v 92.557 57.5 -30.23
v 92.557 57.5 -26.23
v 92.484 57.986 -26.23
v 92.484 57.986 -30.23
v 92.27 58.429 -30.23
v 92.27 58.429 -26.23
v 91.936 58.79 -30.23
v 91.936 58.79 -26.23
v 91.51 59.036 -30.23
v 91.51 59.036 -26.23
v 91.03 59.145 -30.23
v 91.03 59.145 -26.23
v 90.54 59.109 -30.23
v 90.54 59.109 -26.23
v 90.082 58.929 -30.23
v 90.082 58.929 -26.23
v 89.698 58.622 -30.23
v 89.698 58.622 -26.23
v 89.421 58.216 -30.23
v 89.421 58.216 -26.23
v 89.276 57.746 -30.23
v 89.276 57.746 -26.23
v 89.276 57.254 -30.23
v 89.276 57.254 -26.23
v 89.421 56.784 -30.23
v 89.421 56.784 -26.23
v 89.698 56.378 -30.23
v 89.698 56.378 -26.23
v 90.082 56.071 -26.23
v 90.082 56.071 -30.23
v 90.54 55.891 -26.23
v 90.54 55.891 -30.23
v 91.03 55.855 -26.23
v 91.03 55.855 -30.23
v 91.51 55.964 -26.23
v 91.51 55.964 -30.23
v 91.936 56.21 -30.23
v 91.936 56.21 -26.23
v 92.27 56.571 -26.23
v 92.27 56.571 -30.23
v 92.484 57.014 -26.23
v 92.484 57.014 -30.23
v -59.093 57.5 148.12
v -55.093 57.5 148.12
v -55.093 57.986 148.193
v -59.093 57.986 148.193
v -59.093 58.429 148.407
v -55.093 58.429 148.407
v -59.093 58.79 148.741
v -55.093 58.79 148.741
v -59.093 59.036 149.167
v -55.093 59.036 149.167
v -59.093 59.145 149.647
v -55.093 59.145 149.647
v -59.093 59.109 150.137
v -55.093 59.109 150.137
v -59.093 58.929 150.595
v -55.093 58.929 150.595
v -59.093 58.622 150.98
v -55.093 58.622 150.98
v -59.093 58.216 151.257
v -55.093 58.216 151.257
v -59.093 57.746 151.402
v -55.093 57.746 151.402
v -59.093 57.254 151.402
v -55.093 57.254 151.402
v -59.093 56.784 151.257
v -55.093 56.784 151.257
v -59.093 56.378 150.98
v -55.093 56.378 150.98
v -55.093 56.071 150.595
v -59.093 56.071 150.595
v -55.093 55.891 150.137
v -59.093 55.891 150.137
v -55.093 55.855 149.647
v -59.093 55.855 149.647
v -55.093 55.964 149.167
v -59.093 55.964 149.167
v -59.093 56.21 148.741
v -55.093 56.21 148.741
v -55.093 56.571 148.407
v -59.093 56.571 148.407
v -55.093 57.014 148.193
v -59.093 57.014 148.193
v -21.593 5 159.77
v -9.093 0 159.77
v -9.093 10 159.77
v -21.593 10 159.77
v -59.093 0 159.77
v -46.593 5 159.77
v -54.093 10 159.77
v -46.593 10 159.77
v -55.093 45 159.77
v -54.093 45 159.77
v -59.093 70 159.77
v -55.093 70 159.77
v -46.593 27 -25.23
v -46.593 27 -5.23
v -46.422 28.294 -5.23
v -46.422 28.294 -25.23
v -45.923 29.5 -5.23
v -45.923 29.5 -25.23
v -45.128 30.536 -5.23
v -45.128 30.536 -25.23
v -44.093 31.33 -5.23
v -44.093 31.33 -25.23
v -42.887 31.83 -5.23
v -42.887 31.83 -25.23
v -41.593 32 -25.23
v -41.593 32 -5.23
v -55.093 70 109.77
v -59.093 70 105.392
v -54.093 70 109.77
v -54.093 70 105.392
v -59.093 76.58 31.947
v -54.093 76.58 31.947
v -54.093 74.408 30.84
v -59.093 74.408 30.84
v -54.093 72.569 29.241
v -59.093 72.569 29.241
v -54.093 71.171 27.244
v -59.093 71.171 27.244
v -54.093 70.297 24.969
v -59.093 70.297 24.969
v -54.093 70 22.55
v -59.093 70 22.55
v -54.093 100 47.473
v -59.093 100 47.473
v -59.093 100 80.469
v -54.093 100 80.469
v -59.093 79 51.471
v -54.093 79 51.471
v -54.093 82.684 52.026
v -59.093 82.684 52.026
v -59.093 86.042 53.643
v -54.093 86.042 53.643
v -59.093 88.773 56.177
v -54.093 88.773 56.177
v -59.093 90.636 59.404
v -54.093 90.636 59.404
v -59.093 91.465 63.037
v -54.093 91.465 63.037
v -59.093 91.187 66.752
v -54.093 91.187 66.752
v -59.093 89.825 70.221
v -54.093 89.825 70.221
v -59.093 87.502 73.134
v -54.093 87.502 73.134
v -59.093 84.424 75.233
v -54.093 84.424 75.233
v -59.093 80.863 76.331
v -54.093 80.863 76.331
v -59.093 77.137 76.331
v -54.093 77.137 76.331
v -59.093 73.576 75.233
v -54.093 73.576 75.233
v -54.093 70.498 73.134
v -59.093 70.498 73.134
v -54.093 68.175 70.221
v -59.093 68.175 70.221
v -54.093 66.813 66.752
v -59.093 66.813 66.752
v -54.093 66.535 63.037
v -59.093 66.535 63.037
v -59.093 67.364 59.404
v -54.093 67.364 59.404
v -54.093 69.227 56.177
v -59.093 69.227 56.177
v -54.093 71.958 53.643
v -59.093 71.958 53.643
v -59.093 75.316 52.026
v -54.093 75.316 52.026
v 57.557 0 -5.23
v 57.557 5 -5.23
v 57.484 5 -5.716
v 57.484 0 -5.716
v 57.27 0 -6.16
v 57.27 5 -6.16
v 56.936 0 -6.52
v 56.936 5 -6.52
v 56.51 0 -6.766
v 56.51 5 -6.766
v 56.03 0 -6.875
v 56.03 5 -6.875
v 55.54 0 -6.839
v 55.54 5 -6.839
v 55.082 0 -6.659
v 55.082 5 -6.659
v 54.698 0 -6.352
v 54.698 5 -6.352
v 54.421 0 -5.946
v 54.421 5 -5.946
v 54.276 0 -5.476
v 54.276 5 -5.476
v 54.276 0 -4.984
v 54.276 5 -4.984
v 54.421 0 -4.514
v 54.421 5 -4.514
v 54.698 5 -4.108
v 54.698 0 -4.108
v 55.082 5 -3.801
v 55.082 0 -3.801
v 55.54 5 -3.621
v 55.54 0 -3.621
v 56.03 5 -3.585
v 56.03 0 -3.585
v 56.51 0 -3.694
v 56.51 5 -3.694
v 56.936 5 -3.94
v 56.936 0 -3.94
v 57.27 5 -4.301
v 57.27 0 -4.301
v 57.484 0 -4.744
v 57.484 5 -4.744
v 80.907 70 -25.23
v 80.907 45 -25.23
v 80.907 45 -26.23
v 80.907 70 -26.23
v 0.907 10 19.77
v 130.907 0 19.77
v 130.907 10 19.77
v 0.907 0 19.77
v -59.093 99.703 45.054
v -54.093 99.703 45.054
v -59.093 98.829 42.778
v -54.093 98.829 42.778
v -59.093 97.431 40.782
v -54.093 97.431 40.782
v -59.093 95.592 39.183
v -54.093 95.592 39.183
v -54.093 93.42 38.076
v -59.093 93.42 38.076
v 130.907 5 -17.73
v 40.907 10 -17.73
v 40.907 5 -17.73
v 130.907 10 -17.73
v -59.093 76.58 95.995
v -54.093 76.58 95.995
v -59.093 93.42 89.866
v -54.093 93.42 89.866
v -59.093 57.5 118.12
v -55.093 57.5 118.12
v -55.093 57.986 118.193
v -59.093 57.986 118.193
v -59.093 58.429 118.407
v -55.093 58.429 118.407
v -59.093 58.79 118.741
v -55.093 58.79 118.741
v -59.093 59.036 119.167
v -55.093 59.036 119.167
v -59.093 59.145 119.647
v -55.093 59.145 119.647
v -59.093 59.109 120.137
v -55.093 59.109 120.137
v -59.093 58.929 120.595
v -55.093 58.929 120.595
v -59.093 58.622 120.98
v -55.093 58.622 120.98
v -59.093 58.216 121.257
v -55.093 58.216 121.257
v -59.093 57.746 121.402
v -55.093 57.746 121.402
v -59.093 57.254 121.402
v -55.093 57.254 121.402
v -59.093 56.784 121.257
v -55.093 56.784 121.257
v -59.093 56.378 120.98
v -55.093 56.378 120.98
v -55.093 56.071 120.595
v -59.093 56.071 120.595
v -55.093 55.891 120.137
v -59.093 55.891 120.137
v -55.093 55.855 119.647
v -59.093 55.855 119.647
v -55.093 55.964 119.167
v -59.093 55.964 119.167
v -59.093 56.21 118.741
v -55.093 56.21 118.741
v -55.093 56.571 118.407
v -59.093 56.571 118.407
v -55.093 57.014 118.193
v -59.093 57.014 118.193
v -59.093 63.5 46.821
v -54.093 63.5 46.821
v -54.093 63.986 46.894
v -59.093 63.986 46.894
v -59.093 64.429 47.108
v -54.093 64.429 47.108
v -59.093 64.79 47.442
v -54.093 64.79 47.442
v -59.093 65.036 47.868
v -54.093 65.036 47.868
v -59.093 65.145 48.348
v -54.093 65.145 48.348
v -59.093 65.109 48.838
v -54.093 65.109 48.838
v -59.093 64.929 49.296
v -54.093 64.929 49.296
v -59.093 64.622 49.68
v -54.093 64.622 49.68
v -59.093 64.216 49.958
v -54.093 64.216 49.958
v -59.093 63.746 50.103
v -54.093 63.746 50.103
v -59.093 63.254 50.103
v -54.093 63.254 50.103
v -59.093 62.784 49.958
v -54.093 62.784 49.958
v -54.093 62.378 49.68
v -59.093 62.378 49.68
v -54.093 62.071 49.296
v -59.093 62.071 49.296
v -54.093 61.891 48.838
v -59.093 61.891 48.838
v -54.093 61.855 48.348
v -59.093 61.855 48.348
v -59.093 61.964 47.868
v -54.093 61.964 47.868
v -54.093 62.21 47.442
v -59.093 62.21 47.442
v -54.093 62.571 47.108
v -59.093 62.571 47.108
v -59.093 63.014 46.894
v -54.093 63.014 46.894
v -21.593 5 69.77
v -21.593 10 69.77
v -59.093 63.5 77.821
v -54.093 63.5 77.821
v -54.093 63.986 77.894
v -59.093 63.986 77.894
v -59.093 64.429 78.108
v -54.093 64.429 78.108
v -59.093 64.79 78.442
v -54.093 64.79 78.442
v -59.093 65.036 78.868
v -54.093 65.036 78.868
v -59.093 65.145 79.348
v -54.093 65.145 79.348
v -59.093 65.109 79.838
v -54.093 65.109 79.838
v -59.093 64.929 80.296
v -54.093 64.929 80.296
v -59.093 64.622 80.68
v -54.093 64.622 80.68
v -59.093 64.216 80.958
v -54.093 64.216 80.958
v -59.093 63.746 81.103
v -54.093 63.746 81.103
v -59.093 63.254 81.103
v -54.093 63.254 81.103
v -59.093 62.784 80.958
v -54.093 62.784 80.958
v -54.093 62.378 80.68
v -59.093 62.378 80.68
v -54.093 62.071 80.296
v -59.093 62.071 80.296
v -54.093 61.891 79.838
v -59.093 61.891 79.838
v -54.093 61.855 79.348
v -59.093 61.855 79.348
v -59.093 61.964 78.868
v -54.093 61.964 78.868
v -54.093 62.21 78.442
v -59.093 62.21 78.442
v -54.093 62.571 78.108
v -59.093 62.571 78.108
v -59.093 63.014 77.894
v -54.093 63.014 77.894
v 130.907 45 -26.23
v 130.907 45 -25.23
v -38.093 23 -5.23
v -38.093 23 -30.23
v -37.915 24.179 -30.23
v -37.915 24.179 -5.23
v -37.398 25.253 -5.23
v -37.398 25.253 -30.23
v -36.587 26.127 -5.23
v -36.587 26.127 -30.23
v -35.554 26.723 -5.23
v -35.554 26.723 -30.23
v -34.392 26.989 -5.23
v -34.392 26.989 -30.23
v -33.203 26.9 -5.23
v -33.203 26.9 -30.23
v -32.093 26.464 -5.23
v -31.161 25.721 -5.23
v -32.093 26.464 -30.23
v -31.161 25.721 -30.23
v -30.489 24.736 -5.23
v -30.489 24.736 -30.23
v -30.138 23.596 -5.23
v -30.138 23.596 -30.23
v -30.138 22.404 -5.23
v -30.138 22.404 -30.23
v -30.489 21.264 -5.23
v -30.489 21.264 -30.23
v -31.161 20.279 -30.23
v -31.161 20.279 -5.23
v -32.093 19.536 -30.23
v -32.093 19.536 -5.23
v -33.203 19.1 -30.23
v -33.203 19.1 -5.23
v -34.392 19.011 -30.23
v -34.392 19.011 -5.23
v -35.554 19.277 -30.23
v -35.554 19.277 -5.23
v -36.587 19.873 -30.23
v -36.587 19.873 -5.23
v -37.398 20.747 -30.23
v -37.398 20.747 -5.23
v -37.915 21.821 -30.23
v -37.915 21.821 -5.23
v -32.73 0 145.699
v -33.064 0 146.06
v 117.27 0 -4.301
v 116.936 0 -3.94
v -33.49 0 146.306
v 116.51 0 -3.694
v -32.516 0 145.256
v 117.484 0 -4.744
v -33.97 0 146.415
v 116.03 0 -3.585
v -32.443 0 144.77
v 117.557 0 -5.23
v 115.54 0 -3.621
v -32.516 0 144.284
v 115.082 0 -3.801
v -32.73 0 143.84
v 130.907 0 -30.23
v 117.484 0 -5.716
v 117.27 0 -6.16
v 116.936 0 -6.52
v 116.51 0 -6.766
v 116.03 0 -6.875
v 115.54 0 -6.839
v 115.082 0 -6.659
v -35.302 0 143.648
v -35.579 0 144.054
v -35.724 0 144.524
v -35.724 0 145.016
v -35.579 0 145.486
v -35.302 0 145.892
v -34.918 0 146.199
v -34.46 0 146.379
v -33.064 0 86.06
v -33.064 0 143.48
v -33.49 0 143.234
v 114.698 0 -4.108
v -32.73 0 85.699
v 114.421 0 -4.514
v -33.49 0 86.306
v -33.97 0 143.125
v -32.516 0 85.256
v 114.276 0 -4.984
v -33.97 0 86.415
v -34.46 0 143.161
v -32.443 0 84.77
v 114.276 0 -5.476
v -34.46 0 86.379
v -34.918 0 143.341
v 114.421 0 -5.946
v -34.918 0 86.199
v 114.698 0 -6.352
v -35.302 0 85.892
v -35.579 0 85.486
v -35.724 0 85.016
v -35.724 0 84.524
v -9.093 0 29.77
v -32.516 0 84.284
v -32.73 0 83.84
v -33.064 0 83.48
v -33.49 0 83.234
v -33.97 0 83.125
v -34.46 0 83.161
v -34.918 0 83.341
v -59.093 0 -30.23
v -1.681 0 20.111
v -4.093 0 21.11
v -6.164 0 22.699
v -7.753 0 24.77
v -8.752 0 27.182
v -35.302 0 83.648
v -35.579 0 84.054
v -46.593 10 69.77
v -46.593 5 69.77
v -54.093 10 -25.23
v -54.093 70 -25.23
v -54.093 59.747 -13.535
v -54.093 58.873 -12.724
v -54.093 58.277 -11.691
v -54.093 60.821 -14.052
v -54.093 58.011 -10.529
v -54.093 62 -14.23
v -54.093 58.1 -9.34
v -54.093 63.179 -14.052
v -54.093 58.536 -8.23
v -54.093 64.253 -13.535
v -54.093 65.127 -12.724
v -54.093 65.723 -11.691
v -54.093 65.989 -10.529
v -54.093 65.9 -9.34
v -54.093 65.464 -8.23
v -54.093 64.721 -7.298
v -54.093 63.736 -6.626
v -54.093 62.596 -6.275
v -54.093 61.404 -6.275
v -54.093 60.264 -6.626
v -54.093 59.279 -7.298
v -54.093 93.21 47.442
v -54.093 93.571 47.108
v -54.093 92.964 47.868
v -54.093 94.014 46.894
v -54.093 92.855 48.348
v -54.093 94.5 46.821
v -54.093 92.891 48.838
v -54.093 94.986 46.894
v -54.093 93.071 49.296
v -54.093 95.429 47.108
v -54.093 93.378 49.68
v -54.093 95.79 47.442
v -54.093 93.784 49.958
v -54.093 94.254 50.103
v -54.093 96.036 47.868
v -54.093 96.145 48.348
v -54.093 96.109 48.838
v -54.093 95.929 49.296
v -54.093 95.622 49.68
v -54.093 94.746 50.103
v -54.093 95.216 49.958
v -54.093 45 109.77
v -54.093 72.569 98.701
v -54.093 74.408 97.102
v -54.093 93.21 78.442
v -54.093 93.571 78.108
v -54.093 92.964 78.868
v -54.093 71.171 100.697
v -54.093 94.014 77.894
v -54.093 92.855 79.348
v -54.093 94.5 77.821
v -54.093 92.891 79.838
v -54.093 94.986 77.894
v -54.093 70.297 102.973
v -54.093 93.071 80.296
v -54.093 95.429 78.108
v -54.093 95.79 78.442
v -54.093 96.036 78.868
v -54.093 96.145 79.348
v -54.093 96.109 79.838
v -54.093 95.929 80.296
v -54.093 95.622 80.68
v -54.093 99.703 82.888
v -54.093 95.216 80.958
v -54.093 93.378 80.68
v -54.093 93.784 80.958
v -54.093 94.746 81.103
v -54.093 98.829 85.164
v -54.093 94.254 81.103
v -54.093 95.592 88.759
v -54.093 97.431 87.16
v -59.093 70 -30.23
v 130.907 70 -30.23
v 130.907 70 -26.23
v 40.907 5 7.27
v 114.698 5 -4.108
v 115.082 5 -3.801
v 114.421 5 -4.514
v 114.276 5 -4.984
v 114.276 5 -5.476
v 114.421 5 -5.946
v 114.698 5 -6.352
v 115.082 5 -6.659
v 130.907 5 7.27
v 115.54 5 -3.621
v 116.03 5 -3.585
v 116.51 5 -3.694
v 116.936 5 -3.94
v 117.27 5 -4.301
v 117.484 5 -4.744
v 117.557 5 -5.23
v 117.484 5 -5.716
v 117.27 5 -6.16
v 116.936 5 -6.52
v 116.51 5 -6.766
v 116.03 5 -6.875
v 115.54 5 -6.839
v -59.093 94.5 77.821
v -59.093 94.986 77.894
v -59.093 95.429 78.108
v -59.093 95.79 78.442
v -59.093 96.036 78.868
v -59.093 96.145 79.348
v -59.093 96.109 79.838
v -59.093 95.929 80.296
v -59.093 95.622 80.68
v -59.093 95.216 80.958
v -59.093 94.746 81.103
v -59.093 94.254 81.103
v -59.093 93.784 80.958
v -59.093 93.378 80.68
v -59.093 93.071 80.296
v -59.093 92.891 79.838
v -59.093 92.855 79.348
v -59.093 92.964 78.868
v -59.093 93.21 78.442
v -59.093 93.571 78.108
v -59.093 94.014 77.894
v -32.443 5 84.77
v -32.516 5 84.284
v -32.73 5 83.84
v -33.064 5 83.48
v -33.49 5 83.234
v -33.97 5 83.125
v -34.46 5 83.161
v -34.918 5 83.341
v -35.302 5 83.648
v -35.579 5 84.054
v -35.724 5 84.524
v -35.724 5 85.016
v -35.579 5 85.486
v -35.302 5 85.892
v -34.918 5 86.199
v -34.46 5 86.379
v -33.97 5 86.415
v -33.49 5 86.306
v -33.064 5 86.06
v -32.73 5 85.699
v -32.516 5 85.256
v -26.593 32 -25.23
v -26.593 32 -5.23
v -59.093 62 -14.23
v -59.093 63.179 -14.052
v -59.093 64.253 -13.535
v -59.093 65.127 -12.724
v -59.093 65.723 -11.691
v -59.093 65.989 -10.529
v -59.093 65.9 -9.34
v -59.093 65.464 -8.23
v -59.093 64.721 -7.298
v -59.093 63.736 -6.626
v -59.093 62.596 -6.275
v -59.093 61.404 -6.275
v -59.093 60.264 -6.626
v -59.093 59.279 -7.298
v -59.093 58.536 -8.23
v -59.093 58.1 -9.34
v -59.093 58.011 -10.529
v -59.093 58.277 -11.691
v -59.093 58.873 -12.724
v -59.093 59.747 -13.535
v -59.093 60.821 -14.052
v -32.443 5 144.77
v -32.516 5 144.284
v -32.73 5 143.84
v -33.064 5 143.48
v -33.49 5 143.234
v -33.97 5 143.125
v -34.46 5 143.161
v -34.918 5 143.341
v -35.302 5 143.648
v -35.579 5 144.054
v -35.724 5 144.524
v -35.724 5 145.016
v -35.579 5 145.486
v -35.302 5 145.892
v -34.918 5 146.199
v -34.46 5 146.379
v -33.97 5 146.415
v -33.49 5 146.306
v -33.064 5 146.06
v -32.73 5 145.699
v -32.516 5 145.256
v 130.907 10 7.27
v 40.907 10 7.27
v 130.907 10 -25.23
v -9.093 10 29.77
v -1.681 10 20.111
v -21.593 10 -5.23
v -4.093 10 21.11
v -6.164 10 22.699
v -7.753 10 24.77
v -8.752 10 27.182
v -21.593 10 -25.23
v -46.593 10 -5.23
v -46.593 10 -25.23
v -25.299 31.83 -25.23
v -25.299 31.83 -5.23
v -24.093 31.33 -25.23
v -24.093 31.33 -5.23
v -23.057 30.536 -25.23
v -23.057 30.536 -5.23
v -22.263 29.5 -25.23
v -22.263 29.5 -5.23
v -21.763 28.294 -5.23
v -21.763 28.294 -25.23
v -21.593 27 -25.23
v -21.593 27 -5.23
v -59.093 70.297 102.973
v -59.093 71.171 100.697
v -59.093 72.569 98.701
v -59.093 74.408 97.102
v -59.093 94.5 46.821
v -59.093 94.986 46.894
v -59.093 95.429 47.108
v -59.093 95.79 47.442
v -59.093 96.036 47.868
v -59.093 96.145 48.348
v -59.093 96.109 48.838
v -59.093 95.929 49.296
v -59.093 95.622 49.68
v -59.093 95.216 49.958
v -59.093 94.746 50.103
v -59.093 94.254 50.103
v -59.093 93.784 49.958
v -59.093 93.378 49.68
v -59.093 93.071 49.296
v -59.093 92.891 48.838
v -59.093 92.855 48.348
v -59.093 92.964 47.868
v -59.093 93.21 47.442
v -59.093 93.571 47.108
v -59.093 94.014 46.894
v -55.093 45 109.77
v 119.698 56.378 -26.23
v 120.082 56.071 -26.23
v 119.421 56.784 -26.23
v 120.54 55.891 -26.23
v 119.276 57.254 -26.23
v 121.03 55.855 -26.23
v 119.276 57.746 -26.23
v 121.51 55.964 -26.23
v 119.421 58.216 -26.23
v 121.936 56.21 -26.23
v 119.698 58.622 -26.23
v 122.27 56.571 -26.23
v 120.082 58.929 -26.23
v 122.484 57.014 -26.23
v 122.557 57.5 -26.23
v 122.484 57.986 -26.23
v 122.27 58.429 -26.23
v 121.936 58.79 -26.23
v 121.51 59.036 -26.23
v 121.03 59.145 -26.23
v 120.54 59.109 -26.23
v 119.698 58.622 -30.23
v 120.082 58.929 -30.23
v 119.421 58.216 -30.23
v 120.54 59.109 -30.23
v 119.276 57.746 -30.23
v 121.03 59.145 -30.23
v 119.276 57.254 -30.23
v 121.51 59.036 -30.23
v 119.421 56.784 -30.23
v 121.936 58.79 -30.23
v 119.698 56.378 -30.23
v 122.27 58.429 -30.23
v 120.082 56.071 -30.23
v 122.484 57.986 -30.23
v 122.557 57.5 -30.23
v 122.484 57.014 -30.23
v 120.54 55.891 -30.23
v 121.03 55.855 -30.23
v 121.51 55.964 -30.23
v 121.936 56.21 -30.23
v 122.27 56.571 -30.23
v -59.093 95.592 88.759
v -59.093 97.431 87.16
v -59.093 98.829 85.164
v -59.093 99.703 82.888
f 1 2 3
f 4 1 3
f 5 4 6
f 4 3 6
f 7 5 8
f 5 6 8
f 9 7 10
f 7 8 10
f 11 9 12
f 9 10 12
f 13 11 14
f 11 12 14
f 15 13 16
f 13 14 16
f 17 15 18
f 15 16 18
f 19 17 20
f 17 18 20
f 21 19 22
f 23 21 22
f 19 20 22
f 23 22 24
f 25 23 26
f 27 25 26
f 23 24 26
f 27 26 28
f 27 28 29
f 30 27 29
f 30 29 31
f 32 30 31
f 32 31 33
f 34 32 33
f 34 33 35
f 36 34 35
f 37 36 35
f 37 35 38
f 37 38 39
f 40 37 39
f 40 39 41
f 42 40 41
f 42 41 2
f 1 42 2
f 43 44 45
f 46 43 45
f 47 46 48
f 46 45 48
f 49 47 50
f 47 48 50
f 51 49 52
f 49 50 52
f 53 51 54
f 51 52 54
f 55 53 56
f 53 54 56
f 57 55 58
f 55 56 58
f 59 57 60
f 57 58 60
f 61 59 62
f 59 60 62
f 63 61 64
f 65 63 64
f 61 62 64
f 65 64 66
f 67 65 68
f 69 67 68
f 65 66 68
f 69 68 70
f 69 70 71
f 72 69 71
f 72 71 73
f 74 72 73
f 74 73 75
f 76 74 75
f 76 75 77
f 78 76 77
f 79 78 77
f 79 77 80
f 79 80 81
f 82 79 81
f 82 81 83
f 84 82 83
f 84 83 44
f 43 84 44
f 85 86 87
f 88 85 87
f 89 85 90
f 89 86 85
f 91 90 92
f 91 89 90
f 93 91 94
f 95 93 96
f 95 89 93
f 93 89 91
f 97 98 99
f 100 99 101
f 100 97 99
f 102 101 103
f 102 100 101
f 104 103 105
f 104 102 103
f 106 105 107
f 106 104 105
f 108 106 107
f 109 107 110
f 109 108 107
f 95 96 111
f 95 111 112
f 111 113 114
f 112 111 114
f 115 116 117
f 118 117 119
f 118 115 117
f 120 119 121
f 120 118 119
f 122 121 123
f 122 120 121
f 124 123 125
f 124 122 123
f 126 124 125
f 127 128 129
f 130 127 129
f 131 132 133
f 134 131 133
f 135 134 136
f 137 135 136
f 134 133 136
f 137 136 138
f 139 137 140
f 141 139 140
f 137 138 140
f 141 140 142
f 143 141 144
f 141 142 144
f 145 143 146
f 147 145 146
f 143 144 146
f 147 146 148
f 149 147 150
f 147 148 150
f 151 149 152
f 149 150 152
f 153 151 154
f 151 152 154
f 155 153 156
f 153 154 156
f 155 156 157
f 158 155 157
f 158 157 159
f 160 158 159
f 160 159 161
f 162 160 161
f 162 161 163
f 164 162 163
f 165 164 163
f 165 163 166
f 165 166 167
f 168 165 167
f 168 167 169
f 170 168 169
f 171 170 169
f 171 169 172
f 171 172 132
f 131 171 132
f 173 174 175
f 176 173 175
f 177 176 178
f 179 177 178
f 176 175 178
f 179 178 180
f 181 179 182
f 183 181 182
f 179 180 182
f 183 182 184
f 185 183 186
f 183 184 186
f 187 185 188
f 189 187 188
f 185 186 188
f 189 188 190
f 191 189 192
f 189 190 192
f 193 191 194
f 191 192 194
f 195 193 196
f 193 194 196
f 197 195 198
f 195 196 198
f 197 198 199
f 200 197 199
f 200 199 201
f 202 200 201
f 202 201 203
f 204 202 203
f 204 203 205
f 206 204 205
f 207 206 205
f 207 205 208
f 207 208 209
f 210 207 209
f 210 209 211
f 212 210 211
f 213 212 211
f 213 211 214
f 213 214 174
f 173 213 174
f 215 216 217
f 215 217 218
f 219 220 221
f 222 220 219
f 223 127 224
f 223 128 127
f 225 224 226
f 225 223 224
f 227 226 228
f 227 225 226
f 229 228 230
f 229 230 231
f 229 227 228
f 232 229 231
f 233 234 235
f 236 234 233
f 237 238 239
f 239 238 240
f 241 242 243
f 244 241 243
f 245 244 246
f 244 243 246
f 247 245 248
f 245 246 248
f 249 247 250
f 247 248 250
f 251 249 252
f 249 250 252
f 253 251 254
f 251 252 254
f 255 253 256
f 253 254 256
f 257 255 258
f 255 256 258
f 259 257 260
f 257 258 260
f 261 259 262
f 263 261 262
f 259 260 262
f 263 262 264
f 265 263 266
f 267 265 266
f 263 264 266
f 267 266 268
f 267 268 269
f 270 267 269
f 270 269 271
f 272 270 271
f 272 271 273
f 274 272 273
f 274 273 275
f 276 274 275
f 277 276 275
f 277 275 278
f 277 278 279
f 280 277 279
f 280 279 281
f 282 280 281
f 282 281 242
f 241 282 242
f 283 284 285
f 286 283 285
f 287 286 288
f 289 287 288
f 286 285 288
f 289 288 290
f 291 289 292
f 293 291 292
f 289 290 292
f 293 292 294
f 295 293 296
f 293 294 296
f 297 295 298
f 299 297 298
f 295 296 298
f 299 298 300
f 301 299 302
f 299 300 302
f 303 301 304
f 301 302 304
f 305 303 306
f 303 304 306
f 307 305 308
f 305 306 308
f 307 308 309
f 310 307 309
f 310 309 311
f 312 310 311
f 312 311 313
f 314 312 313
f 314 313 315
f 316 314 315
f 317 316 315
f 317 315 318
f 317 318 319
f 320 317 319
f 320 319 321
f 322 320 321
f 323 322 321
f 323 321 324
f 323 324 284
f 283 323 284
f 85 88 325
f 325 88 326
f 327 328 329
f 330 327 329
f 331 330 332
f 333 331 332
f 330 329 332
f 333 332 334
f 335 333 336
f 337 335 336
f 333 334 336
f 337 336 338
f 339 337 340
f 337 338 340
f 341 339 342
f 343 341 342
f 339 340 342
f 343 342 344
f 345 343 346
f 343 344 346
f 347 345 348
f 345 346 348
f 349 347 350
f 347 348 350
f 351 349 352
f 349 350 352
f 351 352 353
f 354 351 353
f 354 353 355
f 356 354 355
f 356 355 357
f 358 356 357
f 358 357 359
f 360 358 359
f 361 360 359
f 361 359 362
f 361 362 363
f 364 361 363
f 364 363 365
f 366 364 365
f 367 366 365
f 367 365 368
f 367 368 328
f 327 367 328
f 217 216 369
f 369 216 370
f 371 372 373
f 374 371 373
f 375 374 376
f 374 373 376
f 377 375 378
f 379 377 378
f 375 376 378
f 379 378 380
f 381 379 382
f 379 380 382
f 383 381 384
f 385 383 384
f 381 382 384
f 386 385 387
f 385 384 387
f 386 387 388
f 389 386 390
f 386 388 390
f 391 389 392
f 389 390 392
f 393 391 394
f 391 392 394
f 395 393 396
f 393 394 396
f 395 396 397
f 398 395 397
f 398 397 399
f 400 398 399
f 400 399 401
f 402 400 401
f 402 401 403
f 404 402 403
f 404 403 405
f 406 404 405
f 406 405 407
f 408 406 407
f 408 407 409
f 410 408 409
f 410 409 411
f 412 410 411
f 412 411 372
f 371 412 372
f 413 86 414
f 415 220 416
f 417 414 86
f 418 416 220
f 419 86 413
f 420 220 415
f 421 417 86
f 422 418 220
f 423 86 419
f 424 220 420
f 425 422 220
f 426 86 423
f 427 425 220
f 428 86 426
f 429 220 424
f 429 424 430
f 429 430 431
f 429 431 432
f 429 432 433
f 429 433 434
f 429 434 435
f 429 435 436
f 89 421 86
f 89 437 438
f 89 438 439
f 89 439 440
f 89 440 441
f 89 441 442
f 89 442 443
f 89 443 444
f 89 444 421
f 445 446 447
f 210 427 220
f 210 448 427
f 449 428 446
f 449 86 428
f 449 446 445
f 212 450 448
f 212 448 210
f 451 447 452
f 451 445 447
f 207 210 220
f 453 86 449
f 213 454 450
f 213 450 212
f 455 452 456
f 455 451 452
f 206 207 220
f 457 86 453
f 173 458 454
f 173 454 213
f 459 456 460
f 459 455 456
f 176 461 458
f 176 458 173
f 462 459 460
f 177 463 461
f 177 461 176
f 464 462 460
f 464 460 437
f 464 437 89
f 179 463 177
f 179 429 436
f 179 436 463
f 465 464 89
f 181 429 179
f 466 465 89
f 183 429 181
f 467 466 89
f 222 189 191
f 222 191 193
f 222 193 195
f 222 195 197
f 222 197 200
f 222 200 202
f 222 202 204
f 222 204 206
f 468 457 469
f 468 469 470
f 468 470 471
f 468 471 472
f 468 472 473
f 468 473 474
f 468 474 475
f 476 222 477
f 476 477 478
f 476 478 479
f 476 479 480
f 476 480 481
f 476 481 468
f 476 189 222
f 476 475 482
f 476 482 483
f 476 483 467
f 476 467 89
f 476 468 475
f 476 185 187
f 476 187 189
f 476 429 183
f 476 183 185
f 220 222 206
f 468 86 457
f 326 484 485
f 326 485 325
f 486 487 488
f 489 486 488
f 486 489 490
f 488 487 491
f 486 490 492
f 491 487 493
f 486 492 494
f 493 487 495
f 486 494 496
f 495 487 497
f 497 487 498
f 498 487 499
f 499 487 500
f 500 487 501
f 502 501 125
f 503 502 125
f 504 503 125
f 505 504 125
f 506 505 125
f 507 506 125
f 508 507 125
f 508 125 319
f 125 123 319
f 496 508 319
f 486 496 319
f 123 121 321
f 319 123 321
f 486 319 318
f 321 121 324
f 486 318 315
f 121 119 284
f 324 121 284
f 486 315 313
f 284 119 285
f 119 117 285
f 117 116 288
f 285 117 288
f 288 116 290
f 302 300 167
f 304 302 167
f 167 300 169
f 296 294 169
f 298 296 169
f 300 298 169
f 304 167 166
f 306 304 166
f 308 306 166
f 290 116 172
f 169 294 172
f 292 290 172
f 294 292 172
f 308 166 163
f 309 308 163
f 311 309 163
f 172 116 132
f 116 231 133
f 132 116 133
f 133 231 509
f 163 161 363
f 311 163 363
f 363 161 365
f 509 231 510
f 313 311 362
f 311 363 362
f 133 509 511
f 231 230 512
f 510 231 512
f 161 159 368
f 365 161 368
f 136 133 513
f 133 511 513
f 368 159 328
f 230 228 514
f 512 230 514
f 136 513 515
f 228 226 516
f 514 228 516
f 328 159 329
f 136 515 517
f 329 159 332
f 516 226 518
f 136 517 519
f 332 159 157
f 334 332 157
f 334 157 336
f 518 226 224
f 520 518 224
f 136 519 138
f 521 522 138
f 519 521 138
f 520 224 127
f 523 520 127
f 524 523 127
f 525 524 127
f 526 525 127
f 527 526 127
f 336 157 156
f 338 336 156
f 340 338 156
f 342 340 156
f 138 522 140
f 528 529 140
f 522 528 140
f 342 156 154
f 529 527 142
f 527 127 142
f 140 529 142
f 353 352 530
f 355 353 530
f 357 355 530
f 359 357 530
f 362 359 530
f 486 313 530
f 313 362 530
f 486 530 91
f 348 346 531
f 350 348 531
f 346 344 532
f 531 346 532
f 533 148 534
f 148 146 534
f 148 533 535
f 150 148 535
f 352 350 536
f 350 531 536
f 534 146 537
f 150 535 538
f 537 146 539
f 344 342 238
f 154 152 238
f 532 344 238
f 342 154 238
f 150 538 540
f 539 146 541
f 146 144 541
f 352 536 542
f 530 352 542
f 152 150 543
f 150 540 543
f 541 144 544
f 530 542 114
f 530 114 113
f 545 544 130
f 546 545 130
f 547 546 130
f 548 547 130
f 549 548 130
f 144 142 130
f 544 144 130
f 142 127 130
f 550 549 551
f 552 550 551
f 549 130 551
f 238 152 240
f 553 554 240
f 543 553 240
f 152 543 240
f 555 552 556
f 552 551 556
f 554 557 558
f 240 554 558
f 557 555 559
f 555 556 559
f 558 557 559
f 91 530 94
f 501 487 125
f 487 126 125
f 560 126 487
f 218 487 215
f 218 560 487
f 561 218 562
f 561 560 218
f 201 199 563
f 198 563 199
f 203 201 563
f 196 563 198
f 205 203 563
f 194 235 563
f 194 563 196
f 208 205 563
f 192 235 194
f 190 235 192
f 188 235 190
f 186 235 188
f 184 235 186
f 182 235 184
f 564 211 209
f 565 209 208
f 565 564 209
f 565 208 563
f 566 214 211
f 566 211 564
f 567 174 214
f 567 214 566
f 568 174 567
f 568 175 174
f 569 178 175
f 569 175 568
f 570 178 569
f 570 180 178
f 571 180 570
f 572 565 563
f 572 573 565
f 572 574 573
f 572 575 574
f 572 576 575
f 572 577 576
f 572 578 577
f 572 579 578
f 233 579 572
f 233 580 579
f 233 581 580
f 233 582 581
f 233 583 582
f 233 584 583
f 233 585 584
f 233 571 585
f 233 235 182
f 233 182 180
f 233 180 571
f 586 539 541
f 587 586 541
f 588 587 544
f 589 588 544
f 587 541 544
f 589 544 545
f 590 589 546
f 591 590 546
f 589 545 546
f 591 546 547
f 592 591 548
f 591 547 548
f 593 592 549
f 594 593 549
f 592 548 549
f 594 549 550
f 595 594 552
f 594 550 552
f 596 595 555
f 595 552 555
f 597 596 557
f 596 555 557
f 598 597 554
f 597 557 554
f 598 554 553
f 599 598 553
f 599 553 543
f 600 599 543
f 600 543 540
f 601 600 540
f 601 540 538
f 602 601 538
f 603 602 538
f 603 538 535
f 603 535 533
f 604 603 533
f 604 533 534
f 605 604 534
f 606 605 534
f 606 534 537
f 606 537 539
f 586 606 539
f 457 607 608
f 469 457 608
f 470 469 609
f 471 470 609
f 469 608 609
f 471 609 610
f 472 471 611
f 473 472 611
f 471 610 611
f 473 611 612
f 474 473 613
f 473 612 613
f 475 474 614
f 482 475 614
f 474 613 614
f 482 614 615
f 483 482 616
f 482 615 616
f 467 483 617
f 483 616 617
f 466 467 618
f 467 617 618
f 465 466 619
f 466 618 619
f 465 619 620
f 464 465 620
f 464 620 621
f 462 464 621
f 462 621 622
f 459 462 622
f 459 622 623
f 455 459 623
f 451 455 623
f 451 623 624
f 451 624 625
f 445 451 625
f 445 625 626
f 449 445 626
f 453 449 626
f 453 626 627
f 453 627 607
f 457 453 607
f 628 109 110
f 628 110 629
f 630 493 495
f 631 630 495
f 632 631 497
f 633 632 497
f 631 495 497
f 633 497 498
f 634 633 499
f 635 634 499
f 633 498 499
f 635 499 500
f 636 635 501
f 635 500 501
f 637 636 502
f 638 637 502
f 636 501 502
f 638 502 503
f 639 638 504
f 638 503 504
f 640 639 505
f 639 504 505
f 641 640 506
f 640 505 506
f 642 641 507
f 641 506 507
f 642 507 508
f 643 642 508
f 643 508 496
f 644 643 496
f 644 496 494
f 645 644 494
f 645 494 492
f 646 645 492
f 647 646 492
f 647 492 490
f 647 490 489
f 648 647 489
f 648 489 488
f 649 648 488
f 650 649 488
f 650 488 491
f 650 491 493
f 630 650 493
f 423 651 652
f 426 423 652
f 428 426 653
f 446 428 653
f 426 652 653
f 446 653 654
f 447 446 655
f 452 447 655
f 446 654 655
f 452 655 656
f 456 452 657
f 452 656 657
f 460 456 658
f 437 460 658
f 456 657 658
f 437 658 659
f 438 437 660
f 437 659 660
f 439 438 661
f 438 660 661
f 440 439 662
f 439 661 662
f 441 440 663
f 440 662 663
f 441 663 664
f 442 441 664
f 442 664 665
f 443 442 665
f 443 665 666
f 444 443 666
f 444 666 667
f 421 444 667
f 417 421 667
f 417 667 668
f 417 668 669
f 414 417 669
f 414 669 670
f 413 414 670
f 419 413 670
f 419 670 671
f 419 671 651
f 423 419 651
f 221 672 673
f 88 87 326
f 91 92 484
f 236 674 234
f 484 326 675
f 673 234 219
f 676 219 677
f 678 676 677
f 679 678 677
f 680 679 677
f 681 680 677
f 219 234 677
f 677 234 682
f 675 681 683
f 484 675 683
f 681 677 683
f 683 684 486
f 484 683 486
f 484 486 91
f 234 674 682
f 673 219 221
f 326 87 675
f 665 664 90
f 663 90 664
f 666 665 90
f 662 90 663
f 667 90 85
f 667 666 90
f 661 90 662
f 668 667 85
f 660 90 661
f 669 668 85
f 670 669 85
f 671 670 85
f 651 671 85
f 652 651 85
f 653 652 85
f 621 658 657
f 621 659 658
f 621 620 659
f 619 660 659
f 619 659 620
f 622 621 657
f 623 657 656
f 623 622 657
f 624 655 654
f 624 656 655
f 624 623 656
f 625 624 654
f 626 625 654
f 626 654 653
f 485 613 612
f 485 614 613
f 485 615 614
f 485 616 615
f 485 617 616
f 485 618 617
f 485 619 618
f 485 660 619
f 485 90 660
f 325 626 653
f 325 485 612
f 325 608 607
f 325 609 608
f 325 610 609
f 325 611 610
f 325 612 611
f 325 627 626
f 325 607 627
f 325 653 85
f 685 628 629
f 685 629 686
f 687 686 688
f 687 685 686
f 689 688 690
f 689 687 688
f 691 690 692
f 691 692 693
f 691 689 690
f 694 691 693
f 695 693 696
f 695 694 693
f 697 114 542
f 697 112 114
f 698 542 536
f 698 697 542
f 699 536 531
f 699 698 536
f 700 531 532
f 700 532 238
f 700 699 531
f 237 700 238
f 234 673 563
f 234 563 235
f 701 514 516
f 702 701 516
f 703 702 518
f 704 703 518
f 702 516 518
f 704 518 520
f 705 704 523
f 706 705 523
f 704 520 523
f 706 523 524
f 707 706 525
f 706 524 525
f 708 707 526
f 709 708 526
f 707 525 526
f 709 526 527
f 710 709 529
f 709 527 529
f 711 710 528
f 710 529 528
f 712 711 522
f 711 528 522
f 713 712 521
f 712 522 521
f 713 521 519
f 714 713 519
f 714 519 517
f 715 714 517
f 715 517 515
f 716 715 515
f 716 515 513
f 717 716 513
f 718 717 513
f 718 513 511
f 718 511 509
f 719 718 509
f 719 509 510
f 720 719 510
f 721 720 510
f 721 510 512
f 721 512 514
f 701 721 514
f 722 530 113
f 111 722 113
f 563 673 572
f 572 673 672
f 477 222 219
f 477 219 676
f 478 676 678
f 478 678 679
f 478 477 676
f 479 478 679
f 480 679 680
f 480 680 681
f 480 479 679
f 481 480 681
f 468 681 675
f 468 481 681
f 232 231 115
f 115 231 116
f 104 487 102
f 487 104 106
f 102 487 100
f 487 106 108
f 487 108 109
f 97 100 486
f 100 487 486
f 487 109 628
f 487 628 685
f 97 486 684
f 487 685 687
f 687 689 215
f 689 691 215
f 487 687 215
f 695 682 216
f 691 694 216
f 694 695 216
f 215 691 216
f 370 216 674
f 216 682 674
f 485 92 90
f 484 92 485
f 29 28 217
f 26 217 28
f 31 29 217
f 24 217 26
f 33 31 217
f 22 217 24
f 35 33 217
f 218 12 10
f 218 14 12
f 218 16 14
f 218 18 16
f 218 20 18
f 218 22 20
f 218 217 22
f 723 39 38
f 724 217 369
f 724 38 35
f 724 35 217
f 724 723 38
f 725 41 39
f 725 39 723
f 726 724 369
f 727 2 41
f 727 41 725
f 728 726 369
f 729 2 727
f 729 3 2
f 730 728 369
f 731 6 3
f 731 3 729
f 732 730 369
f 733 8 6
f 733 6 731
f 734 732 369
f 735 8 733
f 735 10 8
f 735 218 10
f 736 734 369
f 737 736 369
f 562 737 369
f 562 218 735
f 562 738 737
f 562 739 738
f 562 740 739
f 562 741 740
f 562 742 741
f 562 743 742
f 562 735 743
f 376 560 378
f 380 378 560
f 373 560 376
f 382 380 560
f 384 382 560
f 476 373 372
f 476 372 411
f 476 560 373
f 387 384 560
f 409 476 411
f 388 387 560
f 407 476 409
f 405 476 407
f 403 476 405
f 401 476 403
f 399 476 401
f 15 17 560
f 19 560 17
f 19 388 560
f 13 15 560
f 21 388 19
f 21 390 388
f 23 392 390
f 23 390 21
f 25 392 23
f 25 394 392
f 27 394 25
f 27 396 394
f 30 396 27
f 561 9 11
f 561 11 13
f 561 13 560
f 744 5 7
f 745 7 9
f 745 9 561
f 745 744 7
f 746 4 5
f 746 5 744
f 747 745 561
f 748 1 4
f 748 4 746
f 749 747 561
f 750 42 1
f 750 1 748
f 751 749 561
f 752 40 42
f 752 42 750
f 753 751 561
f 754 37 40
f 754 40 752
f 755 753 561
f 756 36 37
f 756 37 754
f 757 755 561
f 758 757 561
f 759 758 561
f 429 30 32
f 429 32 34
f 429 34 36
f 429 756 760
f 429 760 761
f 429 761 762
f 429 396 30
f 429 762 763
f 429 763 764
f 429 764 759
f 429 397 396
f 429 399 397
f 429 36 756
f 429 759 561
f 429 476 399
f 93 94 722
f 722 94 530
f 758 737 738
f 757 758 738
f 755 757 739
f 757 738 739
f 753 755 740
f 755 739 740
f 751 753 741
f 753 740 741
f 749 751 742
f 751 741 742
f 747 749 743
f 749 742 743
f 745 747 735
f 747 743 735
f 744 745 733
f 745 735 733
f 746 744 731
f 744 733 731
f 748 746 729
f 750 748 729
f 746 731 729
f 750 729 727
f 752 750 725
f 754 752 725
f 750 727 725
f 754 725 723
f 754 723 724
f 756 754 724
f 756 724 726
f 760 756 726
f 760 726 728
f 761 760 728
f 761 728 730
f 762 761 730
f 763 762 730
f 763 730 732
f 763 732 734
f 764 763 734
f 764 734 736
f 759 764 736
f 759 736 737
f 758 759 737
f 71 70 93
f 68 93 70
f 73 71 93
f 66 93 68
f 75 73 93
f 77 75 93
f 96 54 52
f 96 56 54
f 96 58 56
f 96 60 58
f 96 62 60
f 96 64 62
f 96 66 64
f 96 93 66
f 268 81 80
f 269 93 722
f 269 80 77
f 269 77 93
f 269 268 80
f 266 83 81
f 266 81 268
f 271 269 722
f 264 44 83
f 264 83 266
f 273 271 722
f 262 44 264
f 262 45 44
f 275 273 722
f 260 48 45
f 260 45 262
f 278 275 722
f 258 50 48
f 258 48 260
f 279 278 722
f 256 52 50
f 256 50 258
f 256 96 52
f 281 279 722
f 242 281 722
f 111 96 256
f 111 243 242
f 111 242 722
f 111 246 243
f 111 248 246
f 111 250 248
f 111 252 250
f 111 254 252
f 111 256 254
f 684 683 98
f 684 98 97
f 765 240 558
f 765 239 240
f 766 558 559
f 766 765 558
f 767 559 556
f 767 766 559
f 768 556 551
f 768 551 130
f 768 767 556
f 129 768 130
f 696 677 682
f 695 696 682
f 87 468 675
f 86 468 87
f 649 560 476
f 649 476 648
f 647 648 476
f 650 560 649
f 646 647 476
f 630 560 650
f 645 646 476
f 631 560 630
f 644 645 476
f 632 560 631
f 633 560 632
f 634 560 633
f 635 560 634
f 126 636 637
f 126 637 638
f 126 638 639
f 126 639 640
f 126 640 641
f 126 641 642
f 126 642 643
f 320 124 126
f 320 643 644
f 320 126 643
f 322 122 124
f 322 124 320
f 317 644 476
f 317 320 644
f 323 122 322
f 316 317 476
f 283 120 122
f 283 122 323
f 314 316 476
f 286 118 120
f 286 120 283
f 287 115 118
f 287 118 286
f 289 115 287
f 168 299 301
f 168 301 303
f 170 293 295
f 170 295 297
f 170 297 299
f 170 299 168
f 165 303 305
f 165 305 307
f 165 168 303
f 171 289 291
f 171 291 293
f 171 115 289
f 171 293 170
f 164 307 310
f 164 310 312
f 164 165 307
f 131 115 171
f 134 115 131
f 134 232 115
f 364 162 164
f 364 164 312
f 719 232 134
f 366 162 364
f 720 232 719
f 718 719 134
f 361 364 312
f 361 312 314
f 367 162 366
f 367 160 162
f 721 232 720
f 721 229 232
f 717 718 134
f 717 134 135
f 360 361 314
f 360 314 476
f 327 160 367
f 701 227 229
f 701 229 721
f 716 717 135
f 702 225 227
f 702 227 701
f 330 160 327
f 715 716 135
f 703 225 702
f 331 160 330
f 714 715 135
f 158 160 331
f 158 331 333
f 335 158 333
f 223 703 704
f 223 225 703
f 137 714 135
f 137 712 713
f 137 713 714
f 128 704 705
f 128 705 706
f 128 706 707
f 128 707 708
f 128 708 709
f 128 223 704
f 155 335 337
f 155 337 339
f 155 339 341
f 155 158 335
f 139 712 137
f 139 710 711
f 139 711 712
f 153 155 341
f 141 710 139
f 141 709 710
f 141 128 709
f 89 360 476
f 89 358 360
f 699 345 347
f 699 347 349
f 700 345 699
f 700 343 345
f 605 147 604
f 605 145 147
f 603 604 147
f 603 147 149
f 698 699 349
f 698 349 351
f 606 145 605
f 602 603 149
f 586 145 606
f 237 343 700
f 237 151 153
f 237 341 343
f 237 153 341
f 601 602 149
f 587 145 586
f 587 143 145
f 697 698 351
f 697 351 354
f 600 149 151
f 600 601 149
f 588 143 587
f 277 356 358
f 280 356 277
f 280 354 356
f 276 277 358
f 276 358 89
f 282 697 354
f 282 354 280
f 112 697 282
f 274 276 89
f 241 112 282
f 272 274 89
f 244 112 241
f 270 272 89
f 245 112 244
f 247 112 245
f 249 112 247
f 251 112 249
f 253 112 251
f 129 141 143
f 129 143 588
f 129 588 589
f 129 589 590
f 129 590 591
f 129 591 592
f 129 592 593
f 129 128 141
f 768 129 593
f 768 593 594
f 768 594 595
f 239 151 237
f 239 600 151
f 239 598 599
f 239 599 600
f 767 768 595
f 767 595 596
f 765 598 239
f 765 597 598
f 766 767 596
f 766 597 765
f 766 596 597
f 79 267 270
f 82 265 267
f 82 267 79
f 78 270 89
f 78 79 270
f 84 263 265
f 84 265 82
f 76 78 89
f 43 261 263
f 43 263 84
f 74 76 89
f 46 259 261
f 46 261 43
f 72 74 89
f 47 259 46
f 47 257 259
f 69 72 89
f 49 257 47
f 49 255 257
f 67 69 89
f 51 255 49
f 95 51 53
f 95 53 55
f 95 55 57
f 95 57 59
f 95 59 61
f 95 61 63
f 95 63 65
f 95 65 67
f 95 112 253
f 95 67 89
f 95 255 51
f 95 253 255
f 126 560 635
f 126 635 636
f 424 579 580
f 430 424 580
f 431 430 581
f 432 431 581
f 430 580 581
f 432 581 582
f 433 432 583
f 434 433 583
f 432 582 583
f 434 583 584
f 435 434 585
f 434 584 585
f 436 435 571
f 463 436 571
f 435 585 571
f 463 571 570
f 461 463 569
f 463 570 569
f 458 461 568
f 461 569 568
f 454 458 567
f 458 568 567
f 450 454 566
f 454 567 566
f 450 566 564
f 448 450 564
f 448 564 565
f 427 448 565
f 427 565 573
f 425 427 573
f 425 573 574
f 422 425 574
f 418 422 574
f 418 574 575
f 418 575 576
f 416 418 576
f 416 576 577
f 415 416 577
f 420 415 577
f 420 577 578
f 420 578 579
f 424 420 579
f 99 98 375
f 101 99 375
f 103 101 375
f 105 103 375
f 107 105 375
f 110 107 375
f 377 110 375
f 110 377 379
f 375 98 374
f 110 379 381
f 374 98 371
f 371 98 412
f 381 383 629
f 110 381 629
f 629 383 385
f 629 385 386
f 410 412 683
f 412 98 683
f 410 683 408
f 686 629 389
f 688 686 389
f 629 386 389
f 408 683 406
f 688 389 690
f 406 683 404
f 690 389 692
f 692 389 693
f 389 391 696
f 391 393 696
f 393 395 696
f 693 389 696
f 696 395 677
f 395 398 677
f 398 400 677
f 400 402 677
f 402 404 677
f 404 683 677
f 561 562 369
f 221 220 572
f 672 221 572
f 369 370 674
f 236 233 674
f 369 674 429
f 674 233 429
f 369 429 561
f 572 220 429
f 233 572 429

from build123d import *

# Parameters (mm, degrees)
BOSS_EXTRUDE1_DEPTH = 10
SKETCH2_W           = 90
SKETCH2_H           = 25
SKETCH2_W_2         = 25
SKETCH2_H_2         = 90
CUT_EXTRUDE1_DEPTH  = 5
SKETCH3_R           = 1.65
CUT_EXTRUDE2_DEPTH  = 6
SKETCH4_W           = 25
SKETCH4_H           = 25
BOSS_EXTRUDE2_DEPTH = 22
SKETCH5_R           = 4
CUT_EXTRUDE3_DEPTH  = 191
FILLET1_R           = 5
SKETCH6_W           = 190
SKETCH6_H           = 90
BOSS_EXTRUDE3_DEPTH = 5
SKETCH7_R           = 4
SKETCH7_R_2         = 12.5
SKETCH7_R_3         = 1.65
CUT_EXTRUDE4_DEPTH  = 6
SKETCH8_W           = 185
SKETCH8_H           = 5
BOSS_EXTRUDE4_DEPTH = 60
SKETCH9_R           = 4
CUT_EXTRUDE5_DEPTH  = 191
CUT_EXTRUDE6_DEPTH  = 6
FILLET2_R           = 10
SKETCH11_W          = 50
SKETCH11_H          = 25
CUT_EXTRUDE7_DEPTH  = 1
SKETCH12_R          = 1.65
CUT_EXTRUDE8_DEPTH  = 5
SKETCH13_W          = 50
SKETCH13_H          = 25
CUT_EXTRUDE9_DEPTH  = 1
SKETCH14_R          = 1.65
CUT_EXTRUDE10_DEPTH = 5


with BuildPart() as part:
    # Sketch1 → Boss-Extrude1 (new body)
    with BuildSketch(Plane(origin=(0, 0, 0), x_dir=(1, 0, 0), z_dir=(0, 1, 0))):
        with BuildLine():
            Line((-59.092867484, 30.230027325), (130.907132516, 30.230027325))
            Line((130.907132516, 30.230027325), (130.907132516, -19.769972675))
            Line((130.907132516, -19.769972675), (0.907132516, -19.769972675))
            ThreePointArc((0.907132516, -19.769972675), (-6.163935296, -22.698904864), (-9.092867484, -29.769972675))
            Line((-9.092867484, -29.769972675), (-9.092867484, -159.769972675))
            Line((-9.092867484, -159.769972675), (-59.092867484, -159.769972675))
            Line((-59.092867484, -159.769972675), (-59.092867484, 30.230027325))
        make_face()
    extrude(amount=BOSS_EXTRUDE1_DEPTH)

    # Sketch2 → Cut-Extrude1 (cut)
    with BuildSketch(Plane(origin=(0, 10, 0), x_dir=(1, 0, 0), z_dir=(0, 1, 0))):
        with Locations((85.907132516, 5.230027325)):
            Rectangle(SKETCH2_W, SKETCH2_H)
        with Locations((-34.092867484, -114.769972675)):
            Rectangle(SKETCH2_W_2, SKETCH2_H_2)
    extrude(amount=-CUT_EXTRUDE1_DEPTH, mode=Mode.SUBTRACT)

    # Sketch3 → Cut-Extrude2 (cut, through all)
    with BuildSketch(Plane(origin=(0, 5, 0), x_dir=(1, 0, 0), z_dir=(0, 1, 0))):
        with Locations((55.907132516, 5.230027325)):
            Circle(SKETCH3_R)
        with Locations((115.907132516, 5.230027325)):
            Circle(SKETCH3_R)
        with Locations((-34.092867483, -84.769972675)):
            Circle(SKETCH3_R)
        with Locations((-34.092867483, -144.769972675)):
            Circle(SKETCH3_R)
    extrude(amount=-CUT_EXTRUDE2_DEPTH, mode=Mode.SUBTRACT)

    # Sketch4 → Boss-Extrude2 (add)
    with BuildSketch(Plane(origin=(0, 10, 0), x_dir=(1, 0, 0), z_dir=(0, 1, 0))):
        with Locations((-34.092867484, 17.730027325)):
            Rectangle(SKETCH4_W, SKETCH4_H)
    extrude(amount=BOSS_EXTRUDE2_DEPTH)

    # Sketch5 → Cut-Extrude3 (cut, through all)
    with BuildSketch(Plane(origin=(0, 0, -30.230027325), x_dir=(-1, 0, 0), z_dir=(0, 0, -1))):
        with Locations((34.092867484, 23)):
            Circle(SKETCH5_R)
    extrude(amount=-CUT_EXTRUDE3_DEPTH, mode=Mode.SUBTRACT)

    # Fillet1
    fillet1_edges = [part.edges().sort_by_distance(p)[0] for p in [
        (-46.592867484, 32, -17.730027325),
        (-21.592867484, 32, -17.730027325),
    ]]
    fillet(fillet1_edges, radius=FILLET1_R)

    # Sketch6 → Boss-Extrude3 (add)
    with BuildSketch(Plane.ZY.offset(59.092867484)):
        with Locations((64.769972675, 55)):
            Rectangle(SKETCH6_W, SKETCH6_H)
    extrude(amount=-BOSS_EXTRUDE3_DEPTH)

    # Sketch7 → Cut-Extrude4 (cut, through all)
    with BuildSketch(Plane(origin=(-54.092867484, 0, 0), x_dir=(0, 0, -1), z_dir=(1, 0, 0))):
        with Locations((10.230027325, 62)):
            Circle(SKETCH7_R)
        with Locations((-63.970957781, 79)):
            Circle(SKETCH7_R_2)
        with Locations((-79.470957781, 94.5)):
            Circle(SKETCH7_R_3)
        with Locations((-48.470957781, 94.5)):
            Circle(SKETCH7_R_3)
        with Locations((-48.470957781, 63.5)):
            Circle(SKETCH7_R_3)
        with Locations((-79.470957781, 63.5)):
            Circle(SKETCH7_R_3)
    extrude(amount=-CUT_EXTRUDE4_DEPTH, mode=Mode.SUBTRACT)

    # Sketch8 → Boss-Extrude4 (add)
    with BuildSketch(Plane(origin=(0, 10, 0), x_dir=(1, 0, 0), z_dir=(0, 1, 0))):
        with Locations((38.407132516, 27.730027325)):
            Rectangle(SKETCH8_W, SKETCH8_H)
    extrude(amount=BOSS_EXTRUDE4_DEPTH)

    # Sketch9 → Cut-Extrude5 (cut, through all)
    with BuildSketch(Plane(origin=(0, 0, -30.230027325), x_dir=(-1, 0, 0), z_dir=(0, 0, -1))):
        with Locations((34.092867484, 23)):
            Circle(SKETCH9_R)
    extrude(amount=-CUT_EXTRUDE5_DEPTH, mode=Mode.SUBTRACT)

    # Sketch10 → Cut-Extrude6 (cut, through all)
    with BuildSketch(Plane(origin=(-54.092867484, 0, 0), x_dir=(0, 0, -1), z_dir=(1, 0, 0))):
        Polygon((-159.769972675, 70), (-98.390064809, 70), (-87.470957781, 100), (-159.769972675, 100), align=None)
        Polygon((-40.470957781, 100), (-29.551850753, 70), (25.230027325, 70), (30.230027325, 70), (30.230027325, 100), align=None)
    extrude(amount=-CUT_EXTRUDE6_DEPTH, mode=Mode.SUBTRACT)

    # Fillet2
    fillet2_edges = [part.edges().sort_by_distance(p)[0] for p in [
        (-56.592867484, 100, 87.470957781),
        (-56.592867484, 70, 98.390064809),
        (-56.592867484, 100, 40.470957781),
        (-56.592867484, 70, 29.551850753),
    ]]
    fillet(fillet2_edges, radius=FILLET2_R)

    # Sketch11 → Cut-Extrude7 (cut)
    with BuildSketch(Plane.XY.offset(-25.230027325)):
        with Locations((105.907132516, 57.5)):
            Rectangle(SKETCH11_W, SKETCH11_H)
    extrude(amount=-CUT_EXTRUDE7_DEPTH, mode=Mode.SUBTRACT)

    # Sketch12 → Cut-Extrude8 (cut, through all)
    with BuildSketch(Plane.XY.offset(-26.230027325)):
        with Locations((90.907132516, 57.5)):
            Circle(SKETCH12_R)
        with Locations((120.907132516, 57.5)):
            Circle(SKETCH12_R)
    extrude(amount=-CUT_EXTRUDE8_DEPTH, mode=Mode.SUBTRACT)

    # Sketch13 → Cut-Extrude9 (cut)
    with BuildSketch(Plane(origin=(-54.092867484, 0, 0), x_dir=(0, 0, -1), z_dir=(1, 0, 0))):
        with Locations((-134.769972675, 57.5)):
            Rectangle(SKETCH13_W, SKETCH13_H)
    extrude(amount=-CUT_EXTRUDE9_DEPTH, mode=Mode.SUBTRACT)

    # Sketch14 → Cut-Extrude10 (cut, through all)
    with BuildSketch(Plane(origin=(-55.092867484, 0, 0), x_dir=(0, 0, -1), z_dir=(1, 0, 0))):
        with Locations((-149.769972675, 57.5)):
            Circle(SKETCH14_R)
        with Locations((-119.769972675, 57.5)):
            Circle(SKETCH14_R)
    extrude(amount=-CUT_EXTRUDE10_DEPTH, mode=Mode.SUBTRACT)


solid = part.part
